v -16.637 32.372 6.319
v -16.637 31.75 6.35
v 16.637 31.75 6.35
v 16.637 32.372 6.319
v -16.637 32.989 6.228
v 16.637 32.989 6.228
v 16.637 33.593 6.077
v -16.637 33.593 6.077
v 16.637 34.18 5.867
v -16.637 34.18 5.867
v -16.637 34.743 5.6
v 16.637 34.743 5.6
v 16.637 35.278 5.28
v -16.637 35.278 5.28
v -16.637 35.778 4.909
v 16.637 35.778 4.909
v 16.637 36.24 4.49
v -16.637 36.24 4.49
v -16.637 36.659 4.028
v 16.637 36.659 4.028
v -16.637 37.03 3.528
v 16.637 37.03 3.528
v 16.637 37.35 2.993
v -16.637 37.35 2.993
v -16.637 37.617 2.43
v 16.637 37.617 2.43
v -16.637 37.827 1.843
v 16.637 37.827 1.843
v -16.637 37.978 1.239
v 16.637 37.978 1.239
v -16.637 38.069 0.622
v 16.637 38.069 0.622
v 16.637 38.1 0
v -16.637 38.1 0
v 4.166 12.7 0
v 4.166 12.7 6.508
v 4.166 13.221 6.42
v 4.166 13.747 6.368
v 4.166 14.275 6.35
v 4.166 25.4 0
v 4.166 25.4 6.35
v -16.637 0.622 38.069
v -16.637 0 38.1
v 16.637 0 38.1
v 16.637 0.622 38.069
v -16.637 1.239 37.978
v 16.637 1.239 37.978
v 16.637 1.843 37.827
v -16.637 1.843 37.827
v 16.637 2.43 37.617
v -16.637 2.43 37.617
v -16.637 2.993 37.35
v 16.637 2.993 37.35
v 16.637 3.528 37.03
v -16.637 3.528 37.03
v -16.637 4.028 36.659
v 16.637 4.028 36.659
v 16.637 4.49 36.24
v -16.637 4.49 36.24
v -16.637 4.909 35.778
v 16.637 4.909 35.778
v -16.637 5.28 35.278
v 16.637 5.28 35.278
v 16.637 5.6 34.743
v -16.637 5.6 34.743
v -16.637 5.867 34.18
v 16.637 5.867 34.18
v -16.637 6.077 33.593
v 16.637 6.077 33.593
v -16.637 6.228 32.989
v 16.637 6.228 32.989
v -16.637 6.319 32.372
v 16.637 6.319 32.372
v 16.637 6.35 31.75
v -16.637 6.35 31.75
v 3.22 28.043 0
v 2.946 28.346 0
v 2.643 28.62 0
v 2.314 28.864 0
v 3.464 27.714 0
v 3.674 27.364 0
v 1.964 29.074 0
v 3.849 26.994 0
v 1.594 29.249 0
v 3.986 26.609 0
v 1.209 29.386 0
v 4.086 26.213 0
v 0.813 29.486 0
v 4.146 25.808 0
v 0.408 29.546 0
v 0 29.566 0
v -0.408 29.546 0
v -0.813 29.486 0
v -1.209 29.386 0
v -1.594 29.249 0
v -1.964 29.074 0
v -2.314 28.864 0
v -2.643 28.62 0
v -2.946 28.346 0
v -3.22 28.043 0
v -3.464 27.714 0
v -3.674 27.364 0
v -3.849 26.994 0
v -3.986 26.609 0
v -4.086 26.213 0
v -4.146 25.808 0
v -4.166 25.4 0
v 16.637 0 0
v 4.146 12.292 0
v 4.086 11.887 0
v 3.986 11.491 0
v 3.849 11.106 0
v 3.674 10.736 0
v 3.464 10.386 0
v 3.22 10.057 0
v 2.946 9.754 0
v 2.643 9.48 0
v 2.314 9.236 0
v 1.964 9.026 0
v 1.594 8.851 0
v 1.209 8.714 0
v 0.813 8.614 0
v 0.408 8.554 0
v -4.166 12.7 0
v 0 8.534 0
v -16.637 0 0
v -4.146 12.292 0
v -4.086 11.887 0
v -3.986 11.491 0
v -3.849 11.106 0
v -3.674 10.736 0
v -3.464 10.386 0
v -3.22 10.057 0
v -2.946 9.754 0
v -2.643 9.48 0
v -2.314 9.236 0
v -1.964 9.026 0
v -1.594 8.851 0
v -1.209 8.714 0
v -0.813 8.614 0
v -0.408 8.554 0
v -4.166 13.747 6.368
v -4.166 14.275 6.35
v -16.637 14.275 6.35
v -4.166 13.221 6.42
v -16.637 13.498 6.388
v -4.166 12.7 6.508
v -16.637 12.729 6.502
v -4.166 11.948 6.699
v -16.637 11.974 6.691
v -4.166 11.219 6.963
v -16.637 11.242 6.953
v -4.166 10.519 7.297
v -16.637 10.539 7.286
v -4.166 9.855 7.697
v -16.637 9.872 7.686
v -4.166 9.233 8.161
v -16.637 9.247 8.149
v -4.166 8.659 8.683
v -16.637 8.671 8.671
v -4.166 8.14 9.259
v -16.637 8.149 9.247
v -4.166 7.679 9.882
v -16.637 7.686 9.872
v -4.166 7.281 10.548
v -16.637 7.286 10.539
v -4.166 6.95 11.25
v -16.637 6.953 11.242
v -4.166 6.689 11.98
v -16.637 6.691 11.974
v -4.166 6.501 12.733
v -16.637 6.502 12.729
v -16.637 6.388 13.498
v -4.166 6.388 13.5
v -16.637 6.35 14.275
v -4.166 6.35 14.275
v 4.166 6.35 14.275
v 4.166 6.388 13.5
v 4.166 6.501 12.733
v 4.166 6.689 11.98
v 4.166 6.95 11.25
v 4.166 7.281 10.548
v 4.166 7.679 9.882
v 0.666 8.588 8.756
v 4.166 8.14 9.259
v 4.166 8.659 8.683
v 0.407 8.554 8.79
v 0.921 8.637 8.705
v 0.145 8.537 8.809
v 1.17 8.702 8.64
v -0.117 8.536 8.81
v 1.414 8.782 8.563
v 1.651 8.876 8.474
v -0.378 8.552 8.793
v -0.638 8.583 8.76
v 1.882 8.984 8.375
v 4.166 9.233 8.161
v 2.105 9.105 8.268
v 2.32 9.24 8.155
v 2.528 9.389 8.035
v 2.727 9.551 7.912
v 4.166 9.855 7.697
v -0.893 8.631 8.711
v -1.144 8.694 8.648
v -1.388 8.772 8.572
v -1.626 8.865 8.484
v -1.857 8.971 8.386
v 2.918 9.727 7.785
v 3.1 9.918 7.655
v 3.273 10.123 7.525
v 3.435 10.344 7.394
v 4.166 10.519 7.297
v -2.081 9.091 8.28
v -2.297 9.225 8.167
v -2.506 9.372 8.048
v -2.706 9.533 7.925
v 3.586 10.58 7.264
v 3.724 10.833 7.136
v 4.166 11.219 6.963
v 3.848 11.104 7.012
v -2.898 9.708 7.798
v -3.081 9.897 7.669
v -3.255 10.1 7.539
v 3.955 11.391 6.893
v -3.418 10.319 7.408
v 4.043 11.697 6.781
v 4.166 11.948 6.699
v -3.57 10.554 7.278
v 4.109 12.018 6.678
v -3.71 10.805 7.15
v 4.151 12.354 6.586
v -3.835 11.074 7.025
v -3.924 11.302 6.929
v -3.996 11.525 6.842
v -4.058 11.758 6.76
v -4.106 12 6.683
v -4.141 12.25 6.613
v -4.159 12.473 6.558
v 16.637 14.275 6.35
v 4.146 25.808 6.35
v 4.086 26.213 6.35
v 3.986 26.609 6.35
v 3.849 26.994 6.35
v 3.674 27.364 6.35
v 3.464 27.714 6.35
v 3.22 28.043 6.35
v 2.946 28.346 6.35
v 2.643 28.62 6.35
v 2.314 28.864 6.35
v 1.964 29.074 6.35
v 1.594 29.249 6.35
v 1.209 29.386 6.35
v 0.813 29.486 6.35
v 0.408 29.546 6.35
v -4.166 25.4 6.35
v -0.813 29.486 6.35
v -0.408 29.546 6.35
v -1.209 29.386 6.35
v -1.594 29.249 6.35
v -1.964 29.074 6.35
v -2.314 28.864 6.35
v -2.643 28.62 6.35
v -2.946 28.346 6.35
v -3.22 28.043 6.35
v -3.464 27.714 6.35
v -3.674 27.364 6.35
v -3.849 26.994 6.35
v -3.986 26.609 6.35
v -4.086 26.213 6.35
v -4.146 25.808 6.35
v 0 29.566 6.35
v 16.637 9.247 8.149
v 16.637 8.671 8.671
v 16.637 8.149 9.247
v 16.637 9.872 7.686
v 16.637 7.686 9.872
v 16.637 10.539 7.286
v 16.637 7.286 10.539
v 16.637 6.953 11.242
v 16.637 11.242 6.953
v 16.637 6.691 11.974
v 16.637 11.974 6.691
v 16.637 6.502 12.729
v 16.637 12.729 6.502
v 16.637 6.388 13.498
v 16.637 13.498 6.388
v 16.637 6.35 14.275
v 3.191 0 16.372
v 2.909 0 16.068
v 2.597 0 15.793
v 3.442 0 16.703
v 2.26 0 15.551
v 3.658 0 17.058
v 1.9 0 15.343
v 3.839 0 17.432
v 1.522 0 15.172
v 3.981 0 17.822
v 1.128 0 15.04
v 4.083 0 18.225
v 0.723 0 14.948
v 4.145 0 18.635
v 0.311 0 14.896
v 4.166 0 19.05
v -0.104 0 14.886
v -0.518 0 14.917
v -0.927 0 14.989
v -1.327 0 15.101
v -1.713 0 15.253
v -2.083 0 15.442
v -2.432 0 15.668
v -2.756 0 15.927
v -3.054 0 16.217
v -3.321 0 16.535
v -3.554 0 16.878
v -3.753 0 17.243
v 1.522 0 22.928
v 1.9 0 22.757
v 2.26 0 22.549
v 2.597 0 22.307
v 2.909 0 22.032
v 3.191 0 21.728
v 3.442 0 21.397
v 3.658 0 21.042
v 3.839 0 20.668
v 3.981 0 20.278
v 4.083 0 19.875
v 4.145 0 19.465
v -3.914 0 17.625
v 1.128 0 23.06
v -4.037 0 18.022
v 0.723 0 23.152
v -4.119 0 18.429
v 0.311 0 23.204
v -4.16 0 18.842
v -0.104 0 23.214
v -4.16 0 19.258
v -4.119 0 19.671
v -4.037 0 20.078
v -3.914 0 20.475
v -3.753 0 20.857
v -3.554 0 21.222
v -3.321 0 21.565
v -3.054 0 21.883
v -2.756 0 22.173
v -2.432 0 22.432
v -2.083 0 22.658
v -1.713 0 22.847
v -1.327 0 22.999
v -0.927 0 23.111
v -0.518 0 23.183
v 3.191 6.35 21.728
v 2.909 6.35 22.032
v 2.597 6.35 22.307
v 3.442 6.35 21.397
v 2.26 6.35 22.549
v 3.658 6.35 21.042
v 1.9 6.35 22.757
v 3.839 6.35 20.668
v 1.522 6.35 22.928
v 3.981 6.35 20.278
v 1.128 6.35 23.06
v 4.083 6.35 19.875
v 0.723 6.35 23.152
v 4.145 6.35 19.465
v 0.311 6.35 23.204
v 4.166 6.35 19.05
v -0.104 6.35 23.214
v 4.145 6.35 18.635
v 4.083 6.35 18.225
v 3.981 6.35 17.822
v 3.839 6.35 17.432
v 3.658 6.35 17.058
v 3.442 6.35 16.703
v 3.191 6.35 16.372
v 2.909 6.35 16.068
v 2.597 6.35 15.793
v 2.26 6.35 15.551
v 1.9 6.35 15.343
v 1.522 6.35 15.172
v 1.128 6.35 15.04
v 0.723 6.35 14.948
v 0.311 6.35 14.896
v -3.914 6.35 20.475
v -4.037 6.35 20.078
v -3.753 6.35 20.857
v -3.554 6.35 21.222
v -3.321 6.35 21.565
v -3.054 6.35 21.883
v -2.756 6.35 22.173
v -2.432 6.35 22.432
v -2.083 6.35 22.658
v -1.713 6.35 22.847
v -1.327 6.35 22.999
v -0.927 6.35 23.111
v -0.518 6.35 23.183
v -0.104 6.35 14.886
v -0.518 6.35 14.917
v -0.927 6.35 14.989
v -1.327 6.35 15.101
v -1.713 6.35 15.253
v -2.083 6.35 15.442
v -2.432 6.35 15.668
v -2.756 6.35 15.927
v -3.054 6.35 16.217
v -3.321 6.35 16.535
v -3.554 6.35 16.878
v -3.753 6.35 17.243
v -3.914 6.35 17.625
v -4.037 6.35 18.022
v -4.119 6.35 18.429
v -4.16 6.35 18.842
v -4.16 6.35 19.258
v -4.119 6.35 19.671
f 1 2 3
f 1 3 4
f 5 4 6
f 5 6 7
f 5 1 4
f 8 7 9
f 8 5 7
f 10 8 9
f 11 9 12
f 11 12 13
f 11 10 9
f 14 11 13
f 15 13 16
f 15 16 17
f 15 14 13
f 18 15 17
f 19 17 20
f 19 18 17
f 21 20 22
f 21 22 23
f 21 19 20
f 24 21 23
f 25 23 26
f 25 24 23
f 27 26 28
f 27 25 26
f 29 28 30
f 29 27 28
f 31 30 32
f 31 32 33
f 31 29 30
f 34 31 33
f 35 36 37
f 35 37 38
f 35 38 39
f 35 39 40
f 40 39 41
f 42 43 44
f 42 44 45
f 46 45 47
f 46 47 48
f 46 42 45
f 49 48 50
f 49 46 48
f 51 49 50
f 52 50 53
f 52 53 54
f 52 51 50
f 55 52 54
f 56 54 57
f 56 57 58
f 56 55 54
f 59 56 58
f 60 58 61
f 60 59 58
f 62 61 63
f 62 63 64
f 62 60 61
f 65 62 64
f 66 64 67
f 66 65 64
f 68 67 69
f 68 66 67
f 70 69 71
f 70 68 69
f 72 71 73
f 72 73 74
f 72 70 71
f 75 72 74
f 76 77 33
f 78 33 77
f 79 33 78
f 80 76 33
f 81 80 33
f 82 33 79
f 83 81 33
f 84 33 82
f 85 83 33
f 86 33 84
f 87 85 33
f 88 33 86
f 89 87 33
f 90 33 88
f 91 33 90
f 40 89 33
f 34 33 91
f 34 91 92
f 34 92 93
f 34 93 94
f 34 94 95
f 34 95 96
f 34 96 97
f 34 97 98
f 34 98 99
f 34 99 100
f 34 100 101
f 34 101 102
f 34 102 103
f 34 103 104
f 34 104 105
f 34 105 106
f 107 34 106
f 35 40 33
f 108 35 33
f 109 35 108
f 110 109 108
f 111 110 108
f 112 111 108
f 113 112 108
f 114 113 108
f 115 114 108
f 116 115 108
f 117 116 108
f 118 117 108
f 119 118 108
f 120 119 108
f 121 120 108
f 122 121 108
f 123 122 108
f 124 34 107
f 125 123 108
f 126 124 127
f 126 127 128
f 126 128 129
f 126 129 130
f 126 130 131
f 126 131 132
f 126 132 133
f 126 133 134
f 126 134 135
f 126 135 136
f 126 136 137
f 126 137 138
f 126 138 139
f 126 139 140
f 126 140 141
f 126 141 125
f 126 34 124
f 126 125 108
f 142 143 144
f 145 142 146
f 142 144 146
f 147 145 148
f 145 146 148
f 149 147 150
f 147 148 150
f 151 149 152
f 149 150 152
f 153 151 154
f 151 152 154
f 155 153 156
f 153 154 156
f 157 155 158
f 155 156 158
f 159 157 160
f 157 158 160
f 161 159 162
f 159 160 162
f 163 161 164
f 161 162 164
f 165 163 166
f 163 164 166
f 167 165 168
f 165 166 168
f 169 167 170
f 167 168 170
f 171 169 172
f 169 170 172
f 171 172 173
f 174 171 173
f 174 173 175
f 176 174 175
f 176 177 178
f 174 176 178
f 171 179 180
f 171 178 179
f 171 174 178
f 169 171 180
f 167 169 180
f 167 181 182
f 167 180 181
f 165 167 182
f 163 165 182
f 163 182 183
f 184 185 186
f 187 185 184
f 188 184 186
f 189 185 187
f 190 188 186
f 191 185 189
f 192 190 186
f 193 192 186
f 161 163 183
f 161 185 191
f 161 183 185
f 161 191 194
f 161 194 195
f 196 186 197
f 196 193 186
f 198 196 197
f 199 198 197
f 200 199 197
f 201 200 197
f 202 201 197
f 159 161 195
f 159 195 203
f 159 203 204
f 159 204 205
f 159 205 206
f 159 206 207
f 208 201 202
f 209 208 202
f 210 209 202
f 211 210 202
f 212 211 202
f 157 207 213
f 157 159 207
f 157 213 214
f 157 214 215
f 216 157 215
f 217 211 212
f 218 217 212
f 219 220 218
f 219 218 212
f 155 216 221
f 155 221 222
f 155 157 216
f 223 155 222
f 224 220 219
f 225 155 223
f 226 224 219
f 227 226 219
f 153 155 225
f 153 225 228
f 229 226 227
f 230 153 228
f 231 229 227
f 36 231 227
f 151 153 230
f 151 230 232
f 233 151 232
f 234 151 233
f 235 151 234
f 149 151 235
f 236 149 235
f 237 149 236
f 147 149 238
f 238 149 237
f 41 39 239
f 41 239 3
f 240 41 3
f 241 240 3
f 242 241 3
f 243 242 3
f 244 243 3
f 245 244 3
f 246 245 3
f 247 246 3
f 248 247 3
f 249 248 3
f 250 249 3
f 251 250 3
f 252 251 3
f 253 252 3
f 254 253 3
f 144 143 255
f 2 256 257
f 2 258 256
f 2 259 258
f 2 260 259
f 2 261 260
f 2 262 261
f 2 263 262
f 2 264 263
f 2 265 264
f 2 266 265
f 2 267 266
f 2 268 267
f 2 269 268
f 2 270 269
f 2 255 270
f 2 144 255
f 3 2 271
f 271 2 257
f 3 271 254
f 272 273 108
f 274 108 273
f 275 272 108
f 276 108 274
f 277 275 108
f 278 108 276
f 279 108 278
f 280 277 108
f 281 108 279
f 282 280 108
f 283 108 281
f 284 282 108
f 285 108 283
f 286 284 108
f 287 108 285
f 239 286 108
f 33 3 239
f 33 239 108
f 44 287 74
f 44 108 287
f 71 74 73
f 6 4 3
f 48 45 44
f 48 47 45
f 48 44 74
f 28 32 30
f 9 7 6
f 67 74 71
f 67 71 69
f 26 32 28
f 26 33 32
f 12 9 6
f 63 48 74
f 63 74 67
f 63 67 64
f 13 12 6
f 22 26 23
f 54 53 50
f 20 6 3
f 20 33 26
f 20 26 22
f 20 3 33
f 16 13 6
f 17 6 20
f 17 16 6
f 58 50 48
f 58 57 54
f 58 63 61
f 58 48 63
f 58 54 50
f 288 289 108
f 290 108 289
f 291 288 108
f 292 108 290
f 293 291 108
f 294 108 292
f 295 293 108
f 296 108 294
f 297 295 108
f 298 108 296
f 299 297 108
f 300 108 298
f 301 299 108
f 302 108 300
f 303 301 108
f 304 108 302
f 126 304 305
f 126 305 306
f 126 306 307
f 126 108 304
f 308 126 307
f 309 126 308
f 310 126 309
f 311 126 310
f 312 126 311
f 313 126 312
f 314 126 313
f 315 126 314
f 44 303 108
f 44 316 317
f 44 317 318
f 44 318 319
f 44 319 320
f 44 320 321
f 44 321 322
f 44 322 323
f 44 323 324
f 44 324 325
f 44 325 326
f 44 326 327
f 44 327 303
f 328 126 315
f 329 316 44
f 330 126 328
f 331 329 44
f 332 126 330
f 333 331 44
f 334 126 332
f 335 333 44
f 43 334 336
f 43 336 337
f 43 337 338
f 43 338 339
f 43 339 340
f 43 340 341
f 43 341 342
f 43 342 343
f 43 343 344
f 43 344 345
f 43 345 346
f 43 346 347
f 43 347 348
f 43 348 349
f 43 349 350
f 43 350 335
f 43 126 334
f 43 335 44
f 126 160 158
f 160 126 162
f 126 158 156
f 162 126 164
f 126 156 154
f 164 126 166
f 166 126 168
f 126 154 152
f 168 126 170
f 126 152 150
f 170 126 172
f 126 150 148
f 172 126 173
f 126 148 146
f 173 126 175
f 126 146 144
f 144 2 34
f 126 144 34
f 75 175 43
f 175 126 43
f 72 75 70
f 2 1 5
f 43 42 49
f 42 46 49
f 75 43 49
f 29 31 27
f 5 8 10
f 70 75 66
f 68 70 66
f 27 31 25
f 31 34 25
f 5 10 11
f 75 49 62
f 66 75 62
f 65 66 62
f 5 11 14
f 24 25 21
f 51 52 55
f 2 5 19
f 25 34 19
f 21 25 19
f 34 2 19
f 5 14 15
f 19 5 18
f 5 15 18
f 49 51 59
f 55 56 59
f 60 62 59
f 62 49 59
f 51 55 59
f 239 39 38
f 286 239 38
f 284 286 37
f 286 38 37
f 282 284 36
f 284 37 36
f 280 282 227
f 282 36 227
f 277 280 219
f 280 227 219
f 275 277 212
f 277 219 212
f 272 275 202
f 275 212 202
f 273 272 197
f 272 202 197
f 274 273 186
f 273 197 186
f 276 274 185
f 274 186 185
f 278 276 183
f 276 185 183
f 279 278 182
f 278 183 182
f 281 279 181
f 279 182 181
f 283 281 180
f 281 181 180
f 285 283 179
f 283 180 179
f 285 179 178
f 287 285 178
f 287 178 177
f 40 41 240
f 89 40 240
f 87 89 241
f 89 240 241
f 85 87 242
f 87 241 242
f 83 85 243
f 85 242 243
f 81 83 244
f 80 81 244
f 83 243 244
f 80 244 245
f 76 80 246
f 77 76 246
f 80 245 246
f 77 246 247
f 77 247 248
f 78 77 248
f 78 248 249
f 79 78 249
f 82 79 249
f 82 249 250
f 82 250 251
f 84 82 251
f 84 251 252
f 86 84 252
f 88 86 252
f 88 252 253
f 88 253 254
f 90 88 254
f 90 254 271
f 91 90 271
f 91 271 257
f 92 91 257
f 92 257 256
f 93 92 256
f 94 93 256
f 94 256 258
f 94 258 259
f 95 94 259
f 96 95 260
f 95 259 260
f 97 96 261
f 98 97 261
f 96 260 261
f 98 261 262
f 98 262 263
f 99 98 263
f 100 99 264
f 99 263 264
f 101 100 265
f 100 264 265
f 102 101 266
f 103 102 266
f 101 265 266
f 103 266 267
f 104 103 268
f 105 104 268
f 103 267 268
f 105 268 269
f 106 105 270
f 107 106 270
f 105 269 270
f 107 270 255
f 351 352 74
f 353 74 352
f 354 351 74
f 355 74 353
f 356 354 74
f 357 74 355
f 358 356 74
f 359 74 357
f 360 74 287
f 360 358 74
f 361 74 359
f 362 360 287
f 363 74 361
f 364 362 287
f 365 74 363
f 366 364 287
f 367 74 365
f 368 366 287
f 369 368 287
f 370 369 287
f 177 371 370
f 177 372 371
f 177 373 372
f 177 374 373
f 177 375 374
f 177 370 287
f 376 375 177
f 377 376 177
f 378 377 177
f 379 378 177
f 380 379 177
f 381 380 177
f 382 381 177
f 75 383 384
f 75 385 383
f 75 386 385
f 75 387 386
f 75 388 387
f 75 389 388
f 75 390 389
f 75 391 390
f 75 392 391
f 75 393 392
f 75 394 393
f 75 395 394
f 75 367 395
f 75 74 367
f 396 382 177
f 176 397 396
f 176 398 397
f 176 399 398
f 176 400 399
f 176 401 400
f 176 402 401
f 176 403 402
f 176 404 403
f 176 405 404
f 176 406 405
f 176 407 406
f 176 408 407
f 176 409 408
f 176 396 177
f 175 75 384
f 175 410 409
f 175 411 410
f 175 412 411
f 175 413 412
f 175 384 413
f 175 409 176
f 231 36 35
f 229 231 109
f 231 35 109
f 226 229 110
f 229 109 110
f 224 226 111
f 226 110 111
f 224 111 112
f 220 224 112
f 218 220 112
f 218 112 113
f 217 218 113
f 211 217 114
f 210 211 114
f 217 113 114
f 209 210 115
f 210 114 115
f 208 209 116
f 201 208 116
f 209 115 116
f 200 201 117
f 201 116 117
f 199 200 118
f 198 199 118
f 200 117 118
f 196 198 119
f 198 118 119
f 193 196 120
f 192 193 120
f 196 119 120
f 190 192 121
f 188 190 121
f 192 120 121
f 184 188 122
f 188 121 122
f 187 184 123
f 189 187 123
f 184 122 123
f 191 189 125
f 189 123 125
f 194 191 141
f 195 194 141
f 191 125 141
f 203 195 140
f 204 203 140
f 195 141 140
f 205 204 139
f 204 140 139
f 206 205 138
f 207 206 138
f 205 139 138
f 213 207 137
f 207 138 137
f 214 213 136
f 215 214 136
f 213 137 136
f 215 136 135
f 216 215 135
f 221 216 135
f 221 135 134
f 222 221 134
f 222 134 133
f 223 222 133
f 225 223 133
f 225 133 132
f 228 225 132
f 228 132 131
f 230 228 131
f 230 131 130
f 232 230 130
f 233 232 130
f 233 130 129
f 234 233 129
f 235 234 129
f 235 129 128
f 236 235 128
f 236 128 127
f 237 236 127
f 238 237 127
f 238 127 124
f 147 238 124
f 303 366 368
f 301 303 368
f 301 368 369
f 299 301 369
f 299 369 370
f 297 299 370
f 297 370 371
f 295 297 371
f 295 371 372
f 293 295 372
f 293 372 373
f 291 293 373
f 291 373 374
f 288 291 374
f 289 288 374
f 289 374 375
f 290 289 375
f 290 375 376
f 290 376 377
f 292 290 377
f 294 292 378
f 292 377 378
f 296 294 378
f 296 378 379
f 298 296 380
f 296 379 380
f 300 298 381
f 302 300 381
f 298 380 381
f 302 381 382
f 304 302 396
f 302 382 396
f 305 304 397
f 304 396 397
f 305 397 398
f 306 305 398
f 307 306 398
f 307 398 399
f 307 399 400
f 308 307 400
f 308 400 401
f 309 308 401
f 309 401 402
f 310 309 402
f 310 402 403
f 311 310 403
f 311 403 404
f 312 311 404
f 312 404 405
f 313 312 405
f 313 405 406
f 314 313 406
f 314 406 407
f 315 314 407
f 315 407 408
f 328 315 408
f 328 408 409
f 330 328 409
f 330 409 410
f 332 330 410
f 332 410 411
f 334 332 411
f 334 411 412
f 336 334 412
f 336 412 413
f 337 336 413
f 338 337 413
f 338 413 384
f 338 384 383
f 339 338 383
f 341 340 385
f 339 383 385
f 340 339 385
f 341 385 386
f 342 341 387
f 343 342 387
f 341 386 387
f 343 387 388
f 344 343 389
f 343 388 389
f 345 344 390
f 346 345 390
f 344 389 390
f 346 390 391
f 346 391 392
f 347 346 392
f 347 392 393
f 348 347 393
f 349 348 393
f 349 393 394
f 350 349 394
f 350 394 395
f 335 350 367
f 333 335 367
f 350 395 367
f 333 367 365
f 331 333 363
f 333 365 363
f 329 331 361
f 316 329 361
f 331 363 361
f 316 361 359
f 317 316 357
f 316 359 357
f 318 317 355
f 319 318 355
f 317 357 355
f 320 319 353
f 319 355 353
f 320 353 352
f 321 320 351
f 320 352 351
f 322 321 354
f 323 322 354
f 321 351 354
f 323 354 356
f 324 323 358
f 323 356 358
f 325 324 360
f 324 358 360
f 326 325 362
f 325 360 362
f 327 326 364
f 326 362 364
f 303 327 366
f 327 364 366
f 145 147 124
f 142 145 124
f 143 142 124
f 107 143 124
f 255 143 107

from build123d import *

# Parameters (mm, degrees)
BOSS_EXTRUDE1_DEPTH          = 33.274
CUT_EXTRUDE1_DEPTH           = 53.31120596
F_5_16_CLEARANCE_HOLE1_D     = 8.3312
F_5_16_CLEARANCE_HOLE1_DEPTH = 38.1
FILLET1_START                = -16.637
FILLET1_DEPTH                = 12.4714
FILLET1_START_2              = 4.1656
FILLET1_2_DEPTH              = 12.4714
FILLET1_START_3              = 6.35
FILLET1_3_DEPTH              = 7.9248
FILLET1_START_4              = -4.1656
FILLET1_4_DEPTH              = 8.3312


with BuildPart() as part:
    # Sketch1 → Boss-Extrude1 (new body)
    with BuildSketch(Plane(origin=(-16.637, 0, 0), x_dir=(0, -1, 0), z_dir=(-1, 0, 0))):
        with BuildLine():
            Line((-6.35, 31.75), (-6.35, 6.35))
            Line((-6.35, 6.35), (-31.75, 6.35))
            ThreePointArc((-31.75, 6.35), (-36.240128061, 4.490128061), (-38.1, 0))
            Line((-38.1, 0), (0, 0))
            Line((0, 0), (0, 38.1))
            ThreePointArc((0, 38.1), (-4.490128061, 36.240128061), (-6.35, 31.75))
        make_face()
    extrude(amount=-BOSS_EXTRUDE1_DEPTH)

    # Sketch2 → Cut-Extrude1 (cut, through all)
    with BuildSketch(Plane.XY.offset(6.35)):
        with BuildLine():
            Line((4.1656, 12.7), (4.1656, 25.4))
            ThreePointArc((4.1656, 25.4), (0, 29.5656), (-4.1656, 25.4))
            Line((-4.1656, 25.4), (-4.1656, 12.7))
            ThreePointArc((-4.1656, 12.7), (0, 8.5344), (4.1656, 12.7))
        make_face()
    extrude(amount=-CUT_EXTRUDE1_DEPTH, mode=Mode.SUBTRACT)

    # 5/16 Clearance Hole1
    with Locations(Plane(origin=(0, 0, 0), x_dir=(-1, 0, 0), z_dir=(0, -1, 0))):
        with Locations((0, -19.05)):
            Hole(F_5_16_CLEARANCE_HOLE1_D / 2, depth=F_5_16_CLEARANCE_HOLE1_DEPTH)

    # Fillet1: read off the stored shape, not the designer's step
    # Fillet1 outline → Fillet1 (add)
    with BuildSketch(Plane.YZ.offset(FILLET1_START)):
        with BuildLine():
            ThreePointArc((14.2748, 6.35), (8.67112018, 8.67112018), (6.35, 14.2748))
            Line((6.35, 14.2748), (6.35, 6.35))
            Line((6.35, 6.35), (14.2748, 6.35))
        make_face()
    extrude(amount=FILLET1_DEPTH)

    # Fillet1 2 outline → Fillet1 2 (add)
    with BuildSketch(Plane.YZ.offset(FILLET1_START_2)):
        with BuildLine():
            ThreePointArc((14.2748, 6.35), (8.67112018, 8.67112018), (6.35, 14.2748))
            Line((6.35, 14.2748), (6.35, 6.35))
            Line((6.35, 6.35), (14.2748, 6.35))
        make_face()
    extrude(amount=FILLET1_2_DEPTH)

    # Fillet1 3 outline → Fillet1 3 (add)
    with BuildSketch(Plane.XY.offset(FILLET1_START_3)):
        with BuildLine():
            ThreePointArc((4.1656, 12.7), (0, 8.5344), (-4.1656, 12.7))
            Line((-4.1656, 12.7), (-4.1656, 6.35))
            Line((-4.1656, 6.35), (4.1656, 6.35))
            Line((4.1656, 6.35), (4.1656, 12.7))
        make_face()
    extrude(amount=FILLET1_3_DEPTH)

    # Fillet1 4 outline → Fillet1 4 (cut)
    with BuildSketch(Plane.YZ.offset(FILLET1_START_4)):
        with BuildLine():
            Line((14, 14.2748), (6.35, 14.2748))
            ThreePointArc((6.35, 14.2748), (8.574791663, 8.769133827), (14, 6.354765909))
            Line((14, 6.354765909), (14, 14.2748))
        make_face()
    extrude(amount=FILLET1_4_DEPTH, mode=Mode.SUBTRACT)


solid = part.part
